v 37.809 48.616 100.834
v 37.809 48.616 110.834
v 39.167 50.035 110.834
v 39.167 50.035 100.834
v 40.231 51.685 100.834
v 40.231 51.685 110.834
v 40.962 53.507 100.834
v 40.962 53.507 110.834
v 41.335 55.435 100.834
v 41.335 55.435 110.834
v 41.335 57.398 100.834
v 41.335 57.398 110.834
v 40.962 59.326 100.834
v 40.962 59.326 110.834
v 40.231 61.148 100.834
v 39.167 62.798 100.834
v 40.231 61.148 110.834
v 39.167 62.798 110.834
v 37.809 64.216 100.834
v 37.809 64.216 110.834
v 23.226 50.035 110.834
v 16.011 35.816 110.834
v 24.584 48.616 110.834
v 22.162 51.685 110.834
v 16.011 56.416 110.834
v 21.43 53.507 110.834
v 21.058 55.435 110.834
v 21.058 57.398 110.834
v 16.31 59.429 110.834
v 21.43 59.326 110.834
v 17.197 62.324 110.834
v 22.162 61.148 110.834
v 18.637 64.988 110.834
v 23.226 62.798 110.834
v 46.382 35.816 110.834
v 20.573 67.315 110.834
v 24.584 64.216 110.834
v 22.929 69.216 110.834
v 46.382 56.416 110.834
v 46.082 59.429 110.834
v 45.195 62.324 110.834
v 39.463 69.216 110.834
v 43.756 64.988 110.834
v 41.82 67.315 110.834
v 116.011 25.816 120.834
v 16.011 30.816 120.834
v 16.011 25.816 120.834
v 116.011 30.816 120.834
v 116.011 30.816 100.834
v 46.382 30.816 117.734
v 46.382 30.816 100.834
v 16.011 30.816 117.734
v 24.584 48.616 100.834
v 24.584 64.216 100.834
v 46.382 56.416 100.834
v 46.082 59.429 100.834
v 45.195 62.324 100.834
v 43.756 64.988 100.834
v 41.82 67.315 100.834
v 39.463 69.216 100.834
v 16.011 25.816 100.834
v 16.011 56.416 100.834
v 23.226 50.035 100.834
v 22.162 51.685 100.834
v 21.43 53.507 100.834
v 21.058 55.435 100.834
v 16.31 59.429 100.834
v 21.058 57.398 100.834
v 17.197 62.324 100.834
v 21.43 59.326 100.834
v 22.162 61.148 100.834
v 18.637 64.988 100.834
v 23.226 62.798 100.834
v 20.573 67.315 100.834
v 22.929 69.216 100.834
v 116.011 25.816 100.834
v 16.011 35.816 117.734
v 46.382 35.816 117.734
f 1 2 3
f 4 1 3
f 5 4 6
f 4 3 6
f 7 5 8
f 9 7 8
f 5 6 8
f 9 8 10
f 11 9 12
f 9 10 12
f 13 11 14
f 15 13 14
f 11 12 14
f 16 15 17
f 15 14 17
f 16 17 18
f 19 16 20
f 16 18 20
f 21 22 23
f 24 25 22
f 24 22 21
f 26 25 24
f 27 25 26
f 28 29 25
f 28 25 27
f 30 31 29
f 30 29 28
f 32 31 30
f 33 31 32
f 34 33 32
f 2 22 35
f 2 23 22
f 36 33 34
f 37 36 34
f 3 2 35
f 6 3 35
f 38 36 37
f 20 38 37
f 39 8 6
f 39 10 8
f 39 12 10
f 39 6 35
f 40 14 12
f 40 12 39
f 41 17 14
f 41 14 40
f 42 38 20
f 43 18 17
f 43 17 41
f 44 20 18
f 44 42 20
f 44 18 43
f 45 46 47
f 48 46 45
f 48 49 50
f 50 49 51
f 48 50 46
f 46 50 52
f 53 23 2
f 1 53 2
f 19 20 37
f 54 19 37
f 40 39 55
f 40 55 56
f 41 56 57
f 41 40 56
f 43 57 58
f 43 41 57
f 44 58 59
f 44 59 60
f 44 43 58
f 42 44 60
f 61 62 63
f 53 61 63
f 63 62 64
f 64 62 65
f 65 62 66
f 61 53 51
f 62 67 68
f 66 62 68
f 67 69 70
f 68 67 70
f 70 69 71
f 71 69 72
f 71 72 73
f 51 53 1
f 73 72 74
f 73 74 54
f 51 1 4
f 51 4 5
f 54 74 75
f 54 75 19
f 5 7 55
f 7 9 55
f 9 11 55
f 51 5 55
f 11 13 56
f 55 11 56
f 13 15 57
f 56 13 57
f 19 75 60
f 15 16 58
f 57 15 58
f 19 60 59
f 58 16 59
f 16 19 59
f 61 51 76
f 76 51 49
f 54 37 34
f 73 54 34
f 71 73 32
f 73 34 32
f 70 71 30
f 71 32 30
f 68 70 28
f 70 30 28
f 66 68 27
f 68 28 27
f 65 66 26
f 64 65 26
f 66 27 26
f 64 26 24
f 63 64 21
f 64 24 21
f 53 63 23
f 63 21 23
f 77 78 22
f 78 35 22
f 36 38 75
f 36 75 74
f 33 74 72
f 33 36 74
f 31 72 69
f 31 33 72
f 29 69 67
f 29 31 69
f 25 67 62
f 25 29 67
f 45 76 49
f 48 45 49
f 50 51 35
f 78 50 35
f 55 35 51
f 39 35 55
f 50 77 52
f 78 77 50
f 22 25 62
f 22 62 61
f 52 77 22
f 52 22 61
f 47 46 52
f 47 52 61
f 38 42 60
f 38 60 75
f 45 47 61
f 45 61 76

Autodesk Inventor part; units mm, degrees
ref_plane "YZ Plane" through (0, 0, 0) normal (1, 0, 0) x (0, 1, 0)
ref_plane "Work Plane1" through (31.1962, 56.4165, 110.8343) normal (0, 0, 1) x (1, 0, 0)
sketch "Sketch2" plane through (31.1962, 56.4165, 110.8343) normal (0, 0, 1) x (1, 0, 0)
  line L0 (6.5, -7.5) -> (-6.5, -7.5) construction
  line L1 (-6.5, 7.5) -> (6.5, 7.5) construction
  arc A0 (6.5, -7.5) -> (6.5, 7.5) centre (-0.1144, 0) ccw construction
  arc A1 (-6.5, 7.5) -> (-6.5, -7.5) centre (0.1144, 0) ccw construction
  line L2 (6.6124, 7.8) -> (-6.6124, 7.8)
  arc A2 (-6.6124, 7.8) -> (-6.6124, -7.8) centre (0.1144, 0) ccw
  line L3 (-6.6124, -7.8) -> (6.6124, -7.8)
  arc A3 (6.6124, -7.8) -> (6.6124, 7.8) centre (-0.1144, 0) ccw
  line L4 (8.2671, 12.8) -> (-8.2671, 12.8)
  arc A4 (-8.2671, 12.8) -> (-8.2671, -12.8) centre (0.1144, 0) ccw
  line L5 (-8.2671, -12.8) -> (8.2671, -12.8)
  arc A5 (8.2671, -12.8) -> (8.2671, 12.8) centre (-0.1144, 0) ccw
  line L6 (15.1856, 0) -> (-15.1856, 0) construction
  line L7 (-15.1856, 0) -> (-15.1856, -30.6)
  line L8 (-15.1856, -30.6) -> (15.1856, -30.6)
  line L9 (15.1856, -30.6) -> (15.1856, 0)
  line L10 (15.1856, -30.6) -> (-15.1856, -30.6)
  line L11 (-15.1856, -30.6) -> (-15.1856, -25.6)
  line L12 (15.1856, -25.6) -> (15.1856, -30.6)
  line L13 (15.1856, -20.6) -> (-15.1856, -20.6)
  line L14 (-15.1856, -30.6) -> (84.8144, -30.6)
  line L15 (84.8144, -30.6) -> (84.8144, -25.6)
  line L16 (84.8144, -25.6) -> (-15.1856, -25.6)
  line L17 (-15.1856, -25.6) -> (-15.1856, -30.6)
  point P0 (-31.1962, -56.4165)
  point P1 (-15.1856, 0)
  dimension "d5" = 0.3
  dimension "d6" = 5
  dimension "d7" = 30.6
  dimension "d16" = 100
extrude "Extrusion1" add sketch "Sketch2" against normal blind 10 contours A5 L5 A4 L4 | L9 L13 L7 A4 L5 A5 | L9 L16 L7 L13 | L9 L8 L7 L16
ref_plane "Work Plane2" through (-8.5806, 30.9168, 125.8343) normal (0, 0, 1) x (1, 0, 0)
extrude "Extrusion2" add sketch "Sketch2" along normal blind 10 and the other way blind 10 contours L16 L15 L14 L9 | L9 L8 L7 L16
extrude "Extrusion3" add sketch "Sketch2" along normal blind 6.9 contours L9 L16 L7 L13 | L9 L8 L7 L16
properties part number "tempHolder"
